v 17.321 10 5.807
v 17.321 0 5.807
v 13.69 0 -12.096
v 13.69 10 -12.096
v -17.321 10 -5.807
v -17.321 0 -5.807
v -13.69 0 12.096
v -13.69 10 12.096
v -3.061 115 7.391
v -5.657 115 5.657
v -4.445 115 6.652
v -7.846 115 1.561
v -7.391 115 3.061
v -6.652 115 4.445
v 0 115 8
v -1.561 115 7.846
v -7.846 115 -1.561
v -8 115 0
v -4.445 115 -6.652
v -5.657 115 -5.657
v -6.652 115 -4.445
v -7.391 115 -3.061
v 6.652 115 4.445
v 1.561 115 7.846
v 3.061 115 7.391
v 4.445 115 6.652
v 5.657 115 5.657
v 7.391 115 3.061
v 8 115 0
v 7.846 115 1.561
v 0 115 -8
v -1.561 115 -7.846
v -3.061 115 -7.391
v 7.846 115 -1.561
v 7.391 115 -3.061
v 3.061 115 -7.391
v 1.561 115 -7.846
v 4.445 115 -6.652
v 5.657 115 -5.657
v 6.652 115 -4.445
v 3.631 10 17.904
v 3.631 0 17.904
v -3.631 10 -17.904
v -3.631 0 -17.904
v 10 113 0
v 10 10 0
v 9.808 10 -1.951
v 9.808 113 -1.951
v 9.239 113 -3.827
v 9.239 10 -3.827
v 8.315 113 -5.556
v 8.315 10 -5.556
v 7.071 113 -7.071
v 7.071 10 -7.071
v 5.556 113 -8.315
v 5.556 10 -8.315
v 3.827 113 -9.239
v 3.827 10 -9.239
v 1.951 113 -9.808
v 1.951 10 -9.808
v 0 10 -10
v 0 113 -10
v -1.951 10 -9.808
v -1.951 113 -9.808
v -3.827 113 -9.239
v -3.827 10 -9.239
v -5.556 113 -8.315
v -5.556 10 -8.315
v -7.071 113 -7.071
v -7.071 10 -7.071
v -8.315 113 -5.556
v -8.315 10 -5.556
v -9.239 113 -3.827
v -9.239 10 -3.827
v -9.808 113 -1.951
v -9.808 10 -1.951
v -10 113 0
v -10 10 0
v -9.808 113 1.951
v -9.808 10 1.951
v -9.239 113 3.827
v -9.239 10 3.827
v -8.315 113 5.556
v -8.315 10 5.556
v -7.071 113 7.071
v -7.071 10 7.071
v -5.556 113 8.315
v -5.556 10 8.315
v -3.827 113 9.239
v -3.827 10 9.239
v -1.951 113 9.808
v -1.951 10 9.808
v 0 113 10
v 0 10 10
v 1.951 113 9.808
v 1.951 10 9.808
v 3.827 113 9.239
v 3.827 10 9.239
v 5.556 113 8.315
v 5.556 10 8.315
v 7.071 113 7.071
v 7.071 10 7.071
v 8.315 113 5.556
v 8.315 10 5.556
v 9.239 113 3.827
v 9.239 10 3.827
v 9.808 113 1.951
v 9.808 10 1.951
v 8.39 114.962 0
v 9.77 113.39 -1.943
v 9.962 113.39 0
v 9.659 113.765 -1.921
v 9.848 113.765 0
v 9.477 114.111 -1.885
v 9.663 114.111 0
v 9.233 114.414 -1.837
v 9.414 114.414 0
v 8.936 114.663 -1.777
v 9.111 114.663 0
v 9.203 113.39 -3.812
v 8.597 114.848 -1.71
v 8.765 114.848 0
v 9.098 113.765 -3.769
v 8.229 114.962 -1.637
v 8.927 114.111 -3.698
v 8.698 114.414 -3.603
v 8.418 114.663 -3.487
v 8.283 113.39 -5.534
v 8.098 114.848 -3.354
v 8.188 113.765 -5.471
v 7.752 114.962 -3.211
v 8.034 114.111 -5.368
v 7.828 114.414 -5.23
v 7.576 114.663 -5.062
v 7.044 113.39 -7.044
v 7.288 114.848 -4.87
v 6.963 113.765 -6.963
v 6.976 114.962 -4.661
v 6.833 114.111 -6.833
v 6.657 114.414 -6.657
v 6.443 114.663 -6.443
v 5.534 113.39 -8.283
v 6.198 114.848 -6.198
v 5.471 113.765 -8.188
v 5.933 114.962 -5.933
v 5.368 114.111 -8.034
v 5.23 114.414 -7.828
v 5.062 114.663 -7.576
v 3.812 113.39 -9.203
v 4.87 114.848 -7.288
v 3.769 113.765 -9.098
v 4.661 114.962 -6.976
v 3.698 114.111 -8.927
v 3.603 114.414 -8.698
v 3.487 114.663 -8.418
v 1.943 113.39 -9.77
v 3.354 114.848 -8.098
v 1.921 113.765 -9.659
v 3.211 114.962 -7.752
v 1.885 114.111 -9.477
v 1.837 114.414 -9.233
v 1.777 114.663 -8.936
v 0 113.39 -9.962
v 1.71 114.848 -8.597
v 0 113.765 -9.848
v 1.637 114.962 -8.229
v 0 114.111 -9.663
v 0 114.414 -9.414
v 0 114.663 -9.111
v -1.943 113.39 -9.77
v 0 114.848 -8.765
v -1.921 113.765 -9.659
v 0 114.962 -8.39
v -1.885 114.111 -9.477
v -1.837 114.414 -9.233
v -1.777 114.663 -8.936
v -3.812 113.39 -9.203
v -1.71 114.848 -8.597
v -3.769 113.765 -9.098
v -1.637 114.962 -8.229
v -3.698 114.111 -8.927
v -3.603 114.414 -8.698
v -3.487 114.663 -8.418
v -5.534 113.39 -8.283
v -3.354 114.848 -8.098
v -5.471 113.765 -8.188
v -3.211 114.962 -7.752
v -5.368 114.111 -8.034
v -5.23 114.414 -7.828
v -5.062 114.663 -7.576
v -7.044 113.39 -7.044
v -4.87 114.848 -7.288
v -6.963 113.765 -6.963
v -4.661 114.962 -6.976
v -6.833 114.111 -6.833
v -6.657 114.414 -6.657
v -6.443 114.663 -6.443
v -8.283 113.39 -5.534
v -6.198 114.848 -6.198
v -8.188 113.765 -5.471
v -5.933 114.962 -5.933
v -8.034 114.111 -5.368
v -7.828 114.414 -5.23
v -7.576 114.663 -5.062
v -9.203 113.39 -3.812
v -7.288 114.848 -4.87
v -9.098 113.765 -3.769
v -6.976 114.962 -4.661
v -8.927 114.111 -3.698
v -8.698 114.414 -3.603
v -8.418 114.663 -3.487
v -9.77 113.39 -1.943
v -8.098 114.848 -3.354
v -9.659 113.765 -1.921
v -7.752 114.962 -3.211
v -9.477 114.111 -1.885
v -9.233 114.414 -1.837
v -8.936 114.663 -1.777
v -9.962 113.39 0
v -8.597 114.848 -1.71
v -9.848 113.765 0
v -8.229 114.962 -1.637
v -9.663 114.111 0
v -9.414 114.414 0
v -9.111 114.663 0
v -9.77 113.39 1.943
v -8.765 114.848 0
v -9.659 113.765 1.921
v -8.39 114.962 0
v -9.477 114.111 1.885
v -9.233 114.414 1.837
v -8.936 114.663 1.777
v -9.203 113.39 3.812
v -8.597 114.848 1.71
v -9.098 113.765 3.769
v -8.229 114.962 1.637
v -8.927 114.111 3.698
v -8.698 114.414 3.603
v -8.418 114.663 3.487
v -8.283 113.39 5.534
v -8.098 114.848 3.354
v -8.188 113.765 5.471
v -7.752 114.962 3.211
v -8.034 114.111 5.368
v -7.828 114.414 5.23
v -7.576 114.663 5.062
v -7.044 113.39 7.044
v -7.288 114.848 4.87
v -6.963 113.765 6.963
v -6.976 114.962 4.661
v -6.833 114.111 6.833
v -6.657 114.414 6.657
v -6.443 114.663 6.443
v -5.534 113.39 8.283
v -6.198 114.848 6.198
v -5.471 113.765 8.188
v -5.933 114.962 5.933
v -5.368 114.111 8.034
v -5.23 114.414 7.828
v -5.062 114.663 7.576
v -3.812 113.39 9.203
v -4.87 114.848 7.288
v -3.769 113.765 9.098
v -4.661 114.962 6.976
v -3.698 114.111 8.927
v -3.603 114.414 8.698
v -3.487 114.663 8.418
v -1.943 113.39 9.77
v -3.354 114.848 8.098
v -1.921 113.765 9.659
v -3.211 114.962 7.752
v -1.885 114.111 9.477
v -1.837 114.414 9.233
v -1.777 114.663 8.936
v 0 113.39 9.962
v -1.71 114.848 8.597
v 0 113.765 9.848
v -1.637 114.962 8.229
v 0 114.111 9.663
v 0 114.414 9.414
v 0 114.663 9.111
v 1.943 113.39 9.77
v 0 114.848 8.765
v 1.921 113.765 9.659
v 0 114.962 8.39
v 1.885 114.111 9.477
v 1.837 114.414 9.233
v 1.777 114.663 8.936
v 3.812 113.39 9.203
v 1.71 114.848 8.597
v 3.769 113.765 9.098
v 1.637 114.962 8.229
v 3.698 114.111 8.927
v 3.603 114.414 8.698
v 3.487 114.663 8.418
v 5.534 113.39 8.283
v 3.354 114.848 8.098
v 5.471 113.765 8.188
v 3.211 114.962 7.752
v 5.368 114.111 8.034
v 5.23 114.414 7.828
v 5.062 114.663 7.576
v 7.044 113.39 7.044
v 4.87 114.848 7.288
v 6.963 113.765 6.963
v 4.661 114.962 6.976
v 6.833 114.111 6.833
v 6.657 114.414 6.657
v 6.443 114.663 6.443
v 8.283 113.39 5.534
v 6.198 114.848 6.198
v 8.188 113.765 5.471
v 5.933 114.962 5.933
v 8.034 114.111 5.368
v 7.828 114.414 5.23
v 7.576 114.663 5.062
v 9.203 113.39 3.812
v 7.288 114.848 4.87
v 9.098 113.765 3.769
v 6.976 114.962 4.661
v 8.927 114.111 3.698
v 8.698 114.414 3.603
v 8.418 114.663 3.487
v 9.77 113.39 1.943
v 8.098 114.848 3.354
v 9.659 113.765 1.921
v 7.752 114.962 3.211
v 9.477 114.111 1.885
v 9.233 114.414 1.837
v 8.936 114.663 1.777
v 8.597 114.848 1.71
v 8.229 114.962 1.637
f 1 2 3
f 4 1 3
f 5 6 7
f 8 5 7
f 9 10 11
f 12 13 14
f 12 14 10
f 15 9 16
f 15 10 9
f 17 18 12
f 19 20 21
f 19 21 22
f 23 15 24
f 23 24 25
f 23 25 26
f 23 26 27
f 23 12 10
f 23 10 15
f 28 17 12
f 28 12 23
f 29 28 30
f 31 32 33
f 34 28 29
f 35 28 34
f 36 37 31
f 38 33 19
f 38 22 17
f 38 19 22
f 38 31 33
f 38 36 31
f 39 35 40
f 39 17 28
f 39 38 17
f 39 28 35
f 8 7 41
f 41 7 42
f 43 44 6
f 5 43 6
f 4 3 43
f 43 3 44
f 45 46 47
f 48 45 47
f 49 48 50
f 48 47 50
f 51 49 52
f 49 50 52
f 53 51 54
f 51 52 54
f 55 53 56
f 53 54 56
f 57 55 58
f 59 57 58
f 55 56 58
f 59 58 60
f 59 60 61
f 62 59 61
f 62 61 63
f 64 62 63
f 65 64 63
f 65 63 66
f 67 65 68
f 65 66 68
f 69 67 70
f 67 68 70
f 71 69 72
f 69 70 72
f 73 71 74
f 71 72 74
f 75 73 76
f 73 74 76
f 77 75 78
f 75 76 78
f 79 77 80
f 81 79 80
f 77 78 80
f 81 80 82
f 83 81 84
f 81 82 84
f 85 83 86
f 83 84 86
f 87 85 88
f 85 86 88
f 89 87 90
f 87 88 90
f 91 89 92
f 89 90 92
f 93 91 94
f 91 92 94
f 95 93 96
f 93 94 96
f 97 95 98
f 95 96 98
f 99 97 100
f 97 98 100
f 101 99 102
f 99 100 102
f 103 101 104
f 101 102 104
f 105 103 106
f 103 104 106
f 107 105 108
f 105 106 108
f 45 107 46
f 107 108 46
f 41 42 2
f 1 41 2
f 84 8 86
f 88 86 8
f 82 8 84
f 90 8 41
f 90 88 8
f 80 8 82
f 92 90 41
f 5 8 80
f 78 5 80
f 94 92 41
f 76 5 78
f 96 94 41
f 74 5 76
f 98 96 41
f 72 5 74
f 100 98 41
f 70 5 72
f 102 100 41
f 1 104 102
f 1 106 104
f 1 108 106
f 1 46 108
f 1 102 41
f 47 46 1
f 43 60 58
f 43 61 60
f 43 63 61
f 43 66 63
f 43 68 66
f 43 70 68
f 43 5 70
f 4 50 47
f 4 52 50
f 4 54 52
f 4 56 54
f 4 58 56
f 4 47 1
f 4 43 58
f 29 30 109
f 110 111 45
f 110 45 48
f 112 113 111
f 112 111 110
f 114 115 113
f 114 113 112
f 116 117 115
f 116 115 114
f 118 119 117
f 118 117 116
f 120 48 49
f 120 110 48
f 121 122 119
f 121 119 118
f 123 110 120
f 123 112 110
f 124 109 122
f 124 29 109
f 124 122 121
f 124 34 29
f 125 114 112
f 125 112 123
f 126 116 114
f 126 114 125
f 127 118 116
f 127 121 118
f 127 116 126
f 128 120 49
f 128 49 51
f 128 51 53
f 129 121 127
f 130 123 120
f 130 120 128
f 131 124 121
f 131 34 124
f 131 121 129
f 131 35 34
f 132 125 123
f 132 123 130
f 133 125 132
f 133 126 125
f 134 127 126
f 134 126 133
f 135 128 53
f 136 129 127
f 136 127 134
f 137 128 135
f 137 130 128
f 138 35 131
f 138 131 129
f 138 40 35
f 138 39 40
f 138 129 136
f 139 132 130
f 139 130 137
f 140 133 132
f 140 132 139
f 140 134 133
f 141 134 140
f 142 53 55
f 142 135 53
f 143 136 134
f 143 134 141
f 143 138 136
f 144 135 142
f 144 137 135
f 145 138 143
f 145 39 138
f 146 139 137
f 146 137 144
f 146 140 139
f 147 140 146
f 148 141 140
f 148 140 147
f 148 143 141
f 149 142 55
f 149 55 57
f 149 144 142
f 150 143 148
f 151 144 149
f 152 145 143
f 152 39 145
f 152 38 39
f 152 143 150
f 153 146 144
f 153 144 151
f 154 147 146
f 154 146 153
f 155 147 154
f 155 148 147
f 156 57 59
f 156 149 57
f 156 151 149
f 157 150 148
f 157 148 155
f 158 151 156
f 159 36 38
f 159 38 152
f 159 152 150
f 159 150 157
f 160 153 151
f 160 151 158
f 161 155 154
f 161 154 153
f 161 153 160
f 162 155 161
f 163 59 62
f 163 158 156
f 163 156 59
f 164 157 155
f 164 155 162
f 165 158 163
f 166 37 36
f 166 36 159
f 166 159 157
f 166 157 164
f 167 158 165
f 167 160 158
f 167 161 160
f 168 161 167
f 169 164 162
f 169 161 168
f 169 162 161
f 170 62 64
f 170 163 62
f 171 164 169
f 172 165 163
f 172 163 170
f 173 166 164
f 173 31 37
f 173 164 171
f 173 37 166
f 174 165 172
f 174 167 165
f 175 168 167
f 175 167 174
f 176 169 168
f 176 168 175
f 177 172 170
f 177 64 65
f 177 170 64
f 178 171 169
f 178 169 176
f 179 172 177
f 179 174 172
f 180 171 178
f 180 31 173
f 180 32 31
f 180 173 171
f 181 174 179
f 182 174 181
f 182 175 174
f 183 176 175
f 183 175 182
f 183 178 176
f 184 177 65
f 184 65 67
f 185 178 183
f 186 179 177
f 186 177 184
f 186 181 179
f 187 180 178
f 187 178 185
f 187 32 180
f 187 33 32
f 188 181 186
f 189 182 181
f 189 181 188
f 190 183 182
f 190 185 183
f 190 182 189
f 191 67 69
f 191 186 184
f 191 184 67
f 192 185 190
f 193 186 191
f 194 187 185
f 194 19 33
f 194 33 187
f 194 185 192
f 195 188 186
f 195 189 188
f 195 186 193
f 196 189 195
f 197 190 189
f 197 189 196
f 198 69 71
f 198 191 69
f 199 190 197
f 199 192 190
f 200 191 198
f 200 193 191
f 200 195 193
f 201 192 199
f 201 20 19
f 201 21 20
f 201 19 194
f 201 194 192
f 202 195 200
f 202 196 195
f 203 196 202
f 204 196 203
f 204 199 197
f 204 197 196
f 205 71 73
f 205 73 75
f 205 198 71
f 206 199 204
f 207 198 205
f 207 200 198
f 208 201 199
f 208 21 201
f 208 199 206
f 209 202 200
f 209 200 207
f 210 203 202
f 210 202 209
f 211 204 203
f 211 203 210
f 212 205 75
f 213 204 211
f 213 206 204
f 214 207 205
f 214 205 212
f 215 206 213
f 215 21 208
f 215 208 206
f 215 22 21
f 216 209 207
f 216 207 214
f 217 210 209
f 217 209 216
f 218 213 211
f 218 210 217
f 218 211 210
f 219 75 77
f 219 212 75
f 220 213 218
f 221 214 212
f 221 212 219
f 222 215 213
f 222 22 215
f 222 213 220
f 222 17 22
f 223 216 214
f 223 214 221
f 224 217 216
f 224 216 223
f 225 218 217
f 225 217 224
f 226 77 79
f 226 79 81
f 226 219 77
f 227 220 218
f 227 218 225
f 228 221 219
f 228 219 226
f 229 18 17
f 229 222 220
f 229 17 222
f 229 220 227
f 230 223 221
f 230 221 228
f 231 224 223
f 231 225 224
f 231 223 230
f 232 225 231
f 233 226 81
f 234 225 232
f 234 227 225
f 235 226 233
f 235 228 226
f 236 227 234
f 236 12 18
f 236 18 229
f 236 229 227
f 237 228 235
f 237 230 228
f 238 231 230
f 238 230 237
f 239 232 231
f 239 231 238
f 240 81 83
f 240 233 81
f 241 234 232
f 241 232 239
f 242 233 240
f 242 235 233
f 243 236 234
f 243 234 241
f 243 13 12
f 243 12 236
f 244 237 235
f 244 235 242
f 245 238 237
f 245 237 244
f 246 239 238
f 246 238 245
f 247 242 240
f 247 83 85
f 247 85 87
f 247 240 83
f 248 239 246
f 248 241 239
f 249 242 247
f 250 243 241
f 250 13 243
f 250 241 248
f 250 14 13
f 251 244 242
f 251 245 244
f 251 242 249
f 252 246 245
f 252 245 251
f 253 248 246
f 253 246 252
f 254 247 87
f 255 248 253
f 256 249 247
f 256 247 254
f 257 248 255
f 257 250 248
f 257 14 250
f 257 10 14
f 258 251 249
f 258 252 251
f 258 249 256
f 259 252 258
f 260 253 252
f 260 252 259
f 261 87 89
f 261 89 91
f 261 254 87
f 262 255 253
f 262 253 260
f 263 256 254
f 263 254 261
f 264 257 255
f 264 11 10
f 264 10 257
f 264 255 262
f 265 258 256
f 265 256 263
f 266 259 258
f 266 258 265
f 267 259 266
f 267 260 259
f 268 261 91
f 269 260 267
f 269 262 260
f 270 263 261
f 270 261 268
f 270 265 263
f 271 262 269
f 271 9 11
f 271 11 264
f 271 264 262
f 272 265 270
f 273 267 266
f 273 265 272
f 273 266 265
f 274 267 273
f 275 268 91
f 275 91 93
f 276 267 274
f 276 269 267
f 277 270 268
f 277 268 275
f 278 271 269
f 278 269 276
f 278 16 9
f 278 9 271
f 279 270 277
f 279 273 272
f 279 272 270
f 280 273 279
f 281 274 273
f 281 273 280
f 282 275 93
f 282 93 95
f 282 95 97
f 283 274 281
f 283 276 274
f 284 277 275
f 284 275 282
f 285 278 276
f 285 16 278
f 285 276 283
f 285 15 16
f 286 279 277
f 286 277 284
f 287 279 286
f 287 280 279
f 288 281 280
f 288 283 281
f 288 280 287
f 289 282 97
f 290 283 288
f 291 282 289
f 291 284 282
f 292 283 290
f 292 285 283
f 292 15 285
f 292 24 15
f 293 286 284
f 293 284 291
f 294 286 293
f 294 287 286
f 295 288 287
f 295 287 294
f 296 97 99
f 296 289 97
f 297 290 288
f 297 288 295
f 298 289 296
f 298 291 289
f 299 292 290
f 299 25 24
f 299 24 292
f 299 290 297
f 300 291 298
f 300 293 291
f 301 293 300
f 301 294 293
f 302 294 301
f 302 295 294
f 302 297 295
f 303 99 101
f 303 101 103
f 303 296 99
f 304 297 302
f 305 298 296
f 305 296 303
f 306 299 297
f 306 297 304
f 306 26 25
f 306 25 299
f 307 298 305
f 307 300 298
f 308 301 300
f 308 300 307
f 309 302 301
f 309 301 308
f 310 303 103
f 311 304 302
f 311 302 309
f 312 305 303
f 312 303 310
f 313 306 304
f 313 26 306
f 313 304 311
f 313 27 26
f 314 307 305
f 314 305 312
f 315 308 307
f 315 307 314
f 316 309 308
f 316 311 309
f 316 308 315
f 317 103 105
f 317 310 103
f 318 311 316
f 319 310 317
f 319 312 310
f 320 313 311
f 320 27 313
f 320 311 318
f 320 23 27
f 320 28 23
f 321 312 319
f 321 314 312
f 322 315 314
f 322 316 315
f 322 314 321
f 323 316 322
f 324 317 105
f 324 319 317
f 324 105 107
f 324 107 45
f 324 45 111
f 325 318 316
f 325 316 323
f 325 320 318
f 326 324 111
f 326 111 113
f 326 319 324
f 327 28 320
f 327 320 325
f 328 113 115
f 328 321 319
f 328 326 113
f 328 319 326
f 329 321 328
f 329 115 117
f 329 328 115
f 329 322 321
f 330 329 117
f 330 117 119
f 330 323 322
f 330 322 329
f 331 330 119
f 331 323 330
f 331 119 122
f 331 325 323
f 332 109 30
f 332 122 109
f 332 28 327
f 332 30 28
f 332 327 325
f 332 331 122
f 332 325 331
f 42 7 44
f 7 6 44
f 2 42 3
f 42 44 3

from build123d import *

# Parameters (mm, degrees)
BOSS_EXTRU_1_DEPTH = 10
ESQUISSE2_R        = 10
BOSS_EXTRU_2_DEPTH = 105
CONG_1_R           = 2


with BuildPart() as part:
    # Esquisse1 → Boss.-Extru.1 (new body)
    with BuildSketch(Plane(origin=(0, 0, 0), x_dir=(1, 0, 0), z_dir=(0, 1, 0))):
        Polygon((-13.68952605, -12.09634845), (3.630982025, -17.90365155), (17.320508076, -5.807303101), (13.68952605, 12.09634845), (-3.630982025, 17.90365155), (-17.320508076, 5.807303101), align=None)
    extrude(amount=BOSS_EXTRU_1_DEPTH)

    # Esquisse2 → Boss.-Extru.2 (add)
    with BuildSketch(Plane(origin=(0, 10, 0), x_dir=(1, 0, 0), z_dir=(0, 1, 0))):
        Circle(ESQUISSE2_R)
    extrude(amount=BOSS_EXTRU_2_DEPTH)

    # Congé1
    cong_1_edges = [part.edges().sort_by_distance(p)[0] for p in [
        (-10, 115, 0),
    ]]
    fillet(cong_1_edges, radius=CONG_1_R)


solid = part.part
